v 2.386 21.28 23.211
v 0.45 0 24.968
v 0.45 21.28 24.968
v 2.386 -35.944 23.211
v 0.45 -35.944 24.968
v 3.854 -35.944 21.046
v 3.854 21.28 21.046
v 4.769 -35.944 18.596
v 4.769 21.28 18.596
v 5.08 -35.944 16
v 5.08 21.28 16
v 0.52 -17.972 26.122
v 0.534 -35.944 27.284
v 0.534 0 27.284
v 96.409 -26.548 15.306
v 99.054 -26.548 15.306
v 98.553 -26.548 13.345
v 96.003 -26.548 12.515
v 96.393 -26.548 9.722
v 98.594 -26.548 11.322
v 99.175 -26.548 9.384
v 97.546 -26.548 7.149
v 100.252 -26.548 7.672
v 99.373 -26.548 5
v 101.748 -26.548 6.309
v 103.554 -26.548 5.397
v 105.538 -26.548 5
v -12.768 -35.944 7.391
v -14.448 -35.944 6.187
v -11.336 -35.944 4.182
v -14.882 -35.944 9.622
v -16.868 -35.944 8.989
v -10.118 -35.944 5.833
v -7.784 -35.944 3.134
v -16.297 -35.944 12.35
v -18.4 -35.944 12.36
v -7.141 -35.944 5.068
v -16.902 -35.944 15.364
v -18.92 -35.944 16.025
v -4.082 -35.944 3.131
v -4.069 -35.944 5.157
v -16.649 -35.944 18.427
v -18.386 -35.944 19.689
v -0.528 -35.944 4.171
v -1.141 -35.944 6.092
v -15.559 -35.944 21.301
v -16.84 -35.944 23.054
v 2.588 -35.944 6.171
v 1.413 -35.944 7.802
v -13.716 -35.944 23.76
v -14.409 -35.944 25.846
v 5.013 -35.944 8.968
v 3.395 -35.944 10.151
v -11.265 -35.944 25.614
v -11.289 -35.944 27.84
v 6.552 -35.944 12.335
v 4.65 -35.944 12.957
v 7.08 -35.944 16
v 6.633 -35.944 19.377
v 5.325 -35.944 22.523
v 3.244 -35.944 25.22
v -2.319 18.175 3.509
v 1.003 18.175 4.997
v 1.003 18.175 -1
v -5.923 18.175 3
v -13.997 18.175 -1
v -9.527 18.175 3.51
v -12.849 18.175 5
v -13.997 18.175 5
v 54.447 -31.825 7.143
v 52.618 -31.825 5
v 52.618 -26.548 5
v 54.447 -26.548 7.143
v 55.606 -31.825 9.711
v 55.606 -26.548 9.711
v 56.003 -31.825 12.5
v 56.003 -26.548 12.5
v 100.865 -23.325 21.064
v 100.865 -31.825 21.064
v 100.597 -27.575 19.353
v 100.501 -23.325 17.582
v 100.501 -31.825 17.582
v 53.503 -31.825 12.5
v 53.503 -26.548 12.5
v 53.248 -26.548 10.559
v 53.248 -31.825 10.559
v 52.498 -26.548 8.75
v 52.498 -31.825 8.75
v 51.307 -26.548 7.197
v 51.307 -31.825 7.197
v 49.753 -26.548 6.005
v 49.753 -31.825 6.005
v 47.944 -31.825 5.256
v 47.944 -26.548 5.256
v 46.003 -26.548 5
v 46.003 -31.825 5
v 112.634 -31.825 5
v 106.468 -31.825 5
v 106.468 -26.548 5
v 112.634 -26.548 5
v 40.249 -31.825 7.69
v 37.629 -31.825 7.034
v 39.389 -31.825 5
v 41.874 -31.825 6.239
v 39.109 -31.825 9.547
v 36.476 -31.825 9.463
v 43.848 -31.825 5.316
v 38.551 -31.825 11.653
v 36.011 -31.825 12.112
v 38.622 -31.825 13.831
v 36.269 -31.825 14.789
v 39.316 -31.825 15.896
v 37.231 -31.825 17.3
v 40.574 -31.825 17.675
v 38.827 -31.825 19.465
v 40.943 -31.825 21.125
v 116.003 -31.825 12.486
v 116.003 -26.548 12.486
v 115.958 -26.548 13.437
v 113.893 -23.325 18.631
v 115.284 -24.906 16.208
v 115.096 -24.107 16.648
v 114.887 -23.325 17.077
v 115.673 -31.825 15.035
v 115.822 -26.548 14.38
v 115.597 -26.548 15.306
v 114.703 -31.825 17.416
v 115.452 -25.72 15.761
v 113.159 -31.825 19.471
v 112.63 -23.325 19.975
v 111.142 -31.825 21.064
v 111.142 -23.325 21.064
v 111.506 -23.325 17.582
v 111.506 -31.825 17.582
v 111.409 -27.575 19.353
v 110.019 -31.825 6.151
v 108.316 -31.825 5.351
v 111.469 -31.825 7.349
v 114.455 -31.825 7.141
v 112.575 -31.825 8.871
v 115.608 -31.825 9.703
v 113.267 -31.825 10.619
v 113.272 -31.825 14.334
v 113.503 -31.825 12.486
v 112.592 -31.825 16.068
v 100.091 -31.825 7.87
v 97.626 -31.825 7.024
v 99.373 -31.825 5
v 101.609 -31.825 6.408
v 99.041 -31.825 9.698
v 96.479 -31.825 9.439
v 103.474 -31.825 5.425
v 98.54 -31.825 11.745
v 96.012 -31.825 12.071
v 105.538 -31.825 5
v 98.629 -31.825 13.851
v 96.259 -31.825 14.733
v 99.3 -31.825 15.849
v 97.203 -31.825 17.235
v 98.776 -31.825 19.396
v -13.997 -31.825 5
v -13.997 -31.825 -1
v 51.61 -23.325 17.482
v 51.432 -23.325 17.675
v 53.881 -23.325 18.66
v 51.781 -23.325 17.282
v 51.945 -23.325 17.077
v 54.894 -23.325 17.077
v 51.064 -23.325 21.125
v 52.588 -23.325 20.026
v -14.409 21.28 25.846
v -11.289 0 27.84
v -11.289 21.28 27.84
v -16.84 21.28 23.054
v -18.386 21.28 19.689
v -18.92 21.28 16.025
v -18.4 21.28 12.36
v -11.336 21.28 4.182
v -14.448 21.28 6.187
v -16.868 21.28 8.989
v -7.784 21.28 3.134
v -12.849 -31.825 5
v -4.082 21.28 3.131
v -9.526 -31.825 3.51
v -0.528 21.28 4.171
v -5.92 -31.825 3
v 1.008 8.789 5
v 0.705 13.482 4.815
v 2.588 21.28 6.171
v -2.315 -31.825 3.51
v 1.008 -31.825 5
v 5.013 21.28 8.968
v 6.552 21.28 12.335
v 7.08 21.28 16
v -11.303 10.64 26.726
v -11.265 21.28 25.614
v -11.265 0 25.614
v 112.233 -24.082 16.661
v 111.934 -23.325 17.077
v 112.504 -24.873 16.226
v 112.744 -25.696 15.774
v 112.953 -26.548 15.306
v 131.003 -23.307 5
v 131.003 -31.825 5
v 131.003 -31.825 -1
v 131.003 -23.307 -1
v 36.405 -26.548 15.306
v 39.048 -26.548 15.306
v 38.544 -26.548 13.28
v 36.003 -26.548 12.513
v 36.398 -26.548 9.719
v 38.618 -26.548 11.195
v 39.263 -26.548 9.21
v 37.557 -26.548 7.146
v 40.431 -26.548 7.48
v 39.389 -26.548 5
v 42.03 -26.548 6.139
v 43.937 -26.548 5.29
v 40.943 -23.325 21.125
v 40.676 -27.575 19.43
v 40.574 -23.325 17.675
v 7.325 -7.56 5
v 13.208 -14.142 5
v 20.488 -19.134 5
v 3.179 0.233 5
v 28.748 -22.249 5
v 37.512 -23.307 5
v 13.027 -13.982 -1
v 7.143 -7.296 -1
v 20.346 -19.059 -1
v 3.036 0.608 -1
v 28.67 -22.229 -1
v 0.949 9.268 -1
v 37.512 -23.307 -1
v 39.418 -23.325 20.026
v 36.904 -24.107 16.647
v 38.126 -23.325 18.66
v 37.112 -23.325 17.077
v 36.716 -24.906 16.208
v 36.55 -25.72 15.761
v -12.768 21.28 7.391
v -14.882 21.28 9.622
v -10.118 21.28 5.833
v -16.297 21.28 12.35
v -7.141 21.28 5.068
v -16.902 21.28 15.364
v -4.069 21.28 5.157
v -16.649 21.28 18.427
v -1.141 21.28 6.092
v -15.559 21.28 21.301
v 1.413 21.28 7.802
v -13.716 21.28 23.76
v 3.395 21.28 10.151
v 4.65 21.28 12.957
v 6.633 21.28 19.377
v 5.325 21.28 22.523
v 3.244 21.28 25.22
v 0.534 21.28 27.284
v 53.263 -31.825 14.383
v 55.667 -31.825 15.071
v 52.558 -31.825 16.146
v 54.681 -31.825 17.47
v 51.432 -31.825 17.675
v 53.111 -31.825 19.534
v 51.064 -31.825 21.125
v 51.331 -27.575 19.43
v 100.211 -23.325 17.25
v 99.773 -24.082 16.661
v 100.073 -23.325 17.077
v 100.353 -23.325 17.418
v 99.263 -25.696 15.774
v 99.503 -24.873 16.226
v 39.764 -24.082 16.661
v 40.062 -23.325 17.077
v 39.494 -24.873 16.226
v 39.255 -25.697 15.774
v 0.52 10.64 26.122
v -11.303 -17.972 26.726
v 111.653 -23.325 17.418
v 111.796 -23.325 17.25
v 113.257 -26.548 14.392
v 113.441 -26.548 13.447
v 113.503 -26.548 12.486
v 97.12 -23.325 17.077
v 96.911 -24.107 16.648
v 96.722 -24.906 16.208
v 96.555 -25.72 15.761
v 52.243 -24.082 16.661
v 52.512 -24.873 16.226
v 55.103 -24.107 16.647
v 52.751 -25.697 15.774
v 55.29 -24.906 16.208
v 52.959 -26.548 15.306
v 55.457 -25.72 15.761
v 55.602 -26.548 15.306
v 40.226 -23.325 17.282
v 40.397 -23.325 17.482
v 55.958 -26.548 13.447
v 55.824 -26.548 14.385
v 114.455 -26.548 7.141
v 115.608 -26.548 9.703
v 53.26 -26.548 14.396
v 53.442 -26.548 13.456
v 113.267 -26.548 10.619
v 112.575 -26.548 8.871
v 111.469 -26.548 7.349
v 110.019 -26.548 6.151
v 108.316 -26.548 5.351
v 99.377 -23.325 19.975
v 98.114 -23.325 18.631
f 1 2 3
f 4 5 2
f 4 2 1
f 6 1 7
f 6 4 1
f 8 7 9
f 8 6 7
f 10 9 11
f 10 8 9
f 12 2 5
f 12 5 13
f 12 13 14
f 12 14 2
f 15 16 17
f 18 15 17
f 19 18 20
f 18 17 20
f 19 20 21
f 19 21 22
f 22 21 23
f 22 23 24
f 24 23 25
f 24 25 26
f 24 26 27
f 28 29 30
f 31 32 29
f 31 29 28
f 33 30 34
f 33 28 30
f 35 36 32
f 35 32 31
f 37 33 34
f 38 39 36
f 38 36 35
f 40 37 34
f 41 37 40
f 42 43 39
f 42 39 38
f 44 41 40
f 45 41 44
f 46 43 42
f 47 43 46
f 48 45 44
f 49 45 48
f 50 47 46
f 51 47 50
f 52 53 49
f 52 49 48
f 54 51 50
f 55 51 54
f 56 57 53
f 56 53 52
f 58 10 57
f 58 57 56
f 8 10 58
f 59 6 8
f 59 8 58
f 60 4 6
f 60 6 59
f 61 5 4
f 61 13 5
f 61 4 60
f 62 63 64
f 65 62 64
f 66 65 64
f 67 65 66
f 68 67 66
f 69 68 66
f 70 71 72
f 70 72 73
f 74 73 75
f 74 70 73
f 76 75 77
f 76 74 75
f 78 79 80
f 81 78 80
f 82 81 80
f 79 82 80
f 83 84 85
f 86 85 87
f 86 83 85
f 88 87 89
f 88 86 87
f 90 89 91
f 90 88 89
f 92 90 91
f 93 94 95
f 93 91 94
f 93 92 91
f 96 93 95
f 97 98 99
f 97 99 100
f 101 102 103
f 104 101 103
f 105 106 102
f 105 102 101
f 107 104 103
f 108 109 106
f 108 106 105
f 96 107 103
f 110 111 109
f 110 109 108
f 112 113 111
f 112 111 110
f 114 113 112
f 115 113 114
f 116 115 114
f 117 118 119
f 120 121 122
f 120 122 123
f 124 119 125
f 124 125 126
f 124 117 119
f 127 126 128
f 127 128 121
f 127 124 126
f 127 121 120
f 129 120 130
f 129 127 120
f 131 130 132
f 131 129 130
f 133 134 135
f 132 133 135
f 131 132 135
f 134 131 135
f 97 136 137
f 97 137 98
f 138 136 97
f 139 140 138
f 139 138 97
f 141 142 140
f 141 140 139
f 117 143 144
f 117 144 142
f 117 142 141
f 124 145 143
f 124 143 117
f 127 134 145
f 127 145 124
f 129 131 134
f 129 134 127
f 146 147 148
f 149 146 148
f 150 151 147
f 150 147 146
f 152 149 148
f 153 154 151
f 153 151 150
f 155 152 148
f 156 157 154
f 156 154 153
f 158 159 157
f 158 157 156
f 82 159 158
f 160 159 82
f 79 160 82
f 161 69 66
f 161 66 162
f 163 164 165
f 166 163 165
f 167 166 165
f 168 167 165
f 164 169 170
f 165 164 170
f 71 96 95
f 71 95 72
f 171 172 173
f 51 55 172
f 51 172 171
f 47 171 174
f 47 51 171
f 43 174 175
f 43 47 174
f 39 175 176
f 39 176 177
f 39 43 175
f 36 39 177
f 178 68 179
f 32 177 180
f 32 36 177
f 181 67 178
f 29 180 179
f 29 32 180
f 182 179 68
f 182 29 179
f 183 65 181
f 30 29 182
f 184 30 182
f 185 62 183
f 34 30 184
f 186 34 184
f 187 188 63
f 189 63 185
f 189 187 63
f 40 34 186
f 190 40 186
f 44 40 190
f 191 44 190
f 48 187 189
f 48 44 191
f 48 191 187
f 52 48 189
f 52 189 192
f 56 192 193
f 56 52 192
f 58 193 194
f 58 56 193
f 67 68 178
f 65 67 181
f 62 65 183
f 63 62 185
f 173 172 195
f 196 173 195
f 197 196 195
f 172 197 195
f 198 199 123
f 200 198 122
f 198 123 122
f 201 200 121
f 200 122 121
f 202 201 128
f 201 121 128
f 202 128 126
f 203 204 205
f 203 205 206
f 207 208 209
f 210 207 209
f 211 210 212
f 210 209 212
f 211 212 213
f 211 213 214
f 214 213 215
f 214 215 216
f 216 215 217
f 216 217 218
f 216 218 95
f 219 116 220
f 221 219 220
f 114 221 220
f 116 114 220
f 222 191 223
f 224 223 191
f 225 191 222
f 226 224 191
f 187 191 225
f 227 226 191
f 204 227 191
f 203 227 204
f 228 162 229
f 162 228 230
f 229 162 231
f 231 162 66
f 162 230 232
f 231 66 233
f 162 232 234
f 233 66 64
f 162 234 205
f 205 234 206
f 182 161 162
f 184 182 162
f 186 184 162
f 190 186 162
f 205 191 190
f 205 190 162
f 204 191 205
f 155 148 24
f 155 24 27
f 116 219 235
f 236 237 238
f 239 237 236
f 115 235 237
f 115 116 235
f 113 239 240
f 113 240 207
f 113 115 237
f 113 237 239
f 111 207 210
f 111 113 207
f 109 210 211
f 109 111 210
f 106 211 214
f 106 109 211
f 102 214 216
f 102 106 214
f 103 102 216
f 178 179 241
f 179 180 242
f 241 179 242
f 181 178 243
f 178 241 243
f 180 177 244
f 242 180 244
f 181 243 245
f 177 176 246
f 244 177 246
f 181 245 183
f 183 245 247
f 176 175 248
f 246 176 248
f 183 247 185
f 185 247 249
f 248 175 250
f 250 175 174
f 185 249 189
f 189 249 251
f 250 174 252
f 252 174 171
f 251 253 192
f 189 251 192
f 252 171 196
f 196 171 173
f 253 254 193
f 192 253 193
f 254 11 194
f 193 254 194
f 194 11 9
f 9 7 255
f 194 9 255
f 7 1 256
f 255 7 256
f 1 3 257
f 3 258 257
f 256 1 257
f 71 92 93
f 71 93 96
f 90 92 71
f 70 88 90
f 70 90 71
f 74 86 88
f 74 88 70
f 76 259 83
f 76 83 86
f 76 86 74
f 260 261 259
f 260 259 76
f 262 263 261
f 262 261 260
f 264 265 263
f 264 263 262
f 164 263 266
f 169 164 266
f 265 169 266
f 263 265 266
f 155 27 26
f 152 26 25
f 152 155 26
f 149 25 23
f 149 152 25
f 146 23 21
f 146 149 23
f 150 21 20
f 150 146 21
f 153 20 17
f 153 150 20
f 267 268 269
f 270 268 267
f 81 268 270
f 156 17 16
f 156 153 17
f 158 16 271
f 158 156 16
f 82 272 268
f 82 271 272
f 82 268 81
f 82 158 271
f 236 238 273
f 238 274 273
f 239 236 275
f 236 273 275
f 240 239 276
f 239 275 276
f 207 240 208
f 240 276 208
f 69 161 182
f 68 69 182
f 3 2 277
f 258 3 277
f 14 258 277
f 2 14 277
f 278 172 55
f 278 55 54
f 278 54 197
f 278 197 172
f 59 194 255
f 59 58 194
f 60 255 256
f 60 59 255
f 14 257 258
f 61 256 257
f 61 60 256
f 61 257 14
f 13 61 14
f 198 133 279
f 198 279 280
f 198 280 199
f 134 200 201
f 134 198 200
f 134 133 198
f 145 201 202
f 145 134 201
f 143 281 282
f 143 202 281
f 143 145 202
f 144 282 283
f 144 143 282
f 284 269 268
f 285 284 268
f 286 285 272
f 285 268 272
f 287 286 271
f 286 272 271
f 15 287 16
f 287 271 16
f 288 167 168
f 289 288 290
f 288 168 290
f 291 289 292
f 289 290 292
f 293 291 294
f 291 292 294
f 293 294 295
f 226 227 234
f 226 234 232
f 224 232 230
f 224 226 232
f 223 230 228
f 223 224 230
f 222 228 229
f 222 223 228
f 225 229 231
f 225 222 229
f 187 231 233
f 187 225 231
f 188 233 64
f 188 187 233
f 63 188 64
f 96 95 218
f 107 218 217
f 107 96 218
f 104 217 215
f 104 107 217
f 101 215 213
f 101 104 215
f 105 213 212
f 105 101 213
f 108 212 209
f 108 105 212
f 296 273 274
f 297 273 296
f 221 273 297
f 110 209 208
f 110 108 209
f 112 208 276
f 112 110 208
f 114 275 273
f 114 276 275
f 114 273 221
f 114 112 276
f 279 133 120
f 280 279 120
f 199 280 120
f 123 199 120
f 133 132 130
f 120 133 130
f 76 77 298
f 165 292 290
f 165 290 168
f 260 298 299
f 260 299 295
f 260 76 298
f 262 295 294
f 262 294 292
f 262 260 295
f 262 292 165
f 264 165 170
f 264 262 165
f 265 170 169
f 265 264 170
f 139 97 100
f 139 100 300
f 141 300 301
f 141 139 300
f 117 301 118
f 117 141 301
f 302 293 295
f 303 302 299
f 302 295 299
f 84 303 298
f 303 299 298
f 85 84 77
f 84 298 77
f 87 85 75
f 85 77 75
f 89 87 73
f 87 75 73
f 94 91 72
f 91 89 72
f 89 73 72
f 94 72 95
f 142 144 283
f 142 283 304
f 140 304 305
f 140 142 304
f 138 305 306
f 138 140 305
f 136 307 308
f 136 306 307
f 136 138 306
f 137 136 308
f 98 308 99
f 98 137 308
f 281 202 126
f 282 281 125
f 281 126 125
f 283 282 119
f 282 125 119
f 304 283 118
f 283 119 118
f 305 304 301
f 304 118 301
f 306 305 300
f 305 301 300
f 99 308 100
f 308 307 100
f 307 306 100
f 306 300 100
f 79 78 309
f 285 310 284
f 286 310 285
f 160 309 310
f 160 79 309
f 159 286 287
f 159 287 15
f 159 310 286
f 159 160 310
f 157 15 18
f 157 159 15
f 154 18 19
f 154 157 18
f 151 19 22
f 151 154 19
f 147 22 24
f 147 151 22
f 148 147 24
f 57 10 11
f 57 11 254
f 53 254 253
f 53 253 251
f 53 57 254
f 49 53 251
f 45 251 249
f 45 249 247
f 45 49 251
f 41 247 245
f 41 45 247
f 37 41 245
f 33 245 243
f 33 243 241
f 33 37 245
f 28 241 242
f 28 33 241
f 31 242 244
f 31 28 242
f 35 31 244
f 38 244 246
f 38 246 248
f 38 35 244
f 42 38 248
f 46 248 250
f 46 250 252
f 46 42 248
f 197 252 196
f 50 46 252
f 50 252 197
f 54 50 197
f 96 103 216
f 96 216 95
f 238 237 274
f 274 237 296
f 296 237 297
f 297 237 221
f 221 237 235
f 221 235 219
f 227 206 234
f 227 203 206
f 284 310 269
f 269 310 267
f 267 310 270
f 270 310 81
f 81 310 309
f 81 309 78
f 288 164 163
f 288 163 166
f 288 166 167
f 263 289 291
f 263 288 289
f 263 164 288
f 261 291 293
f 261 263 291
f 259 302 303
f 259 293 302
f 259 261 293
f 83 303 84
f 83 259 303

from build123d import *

# Parameters (mm, degrees)
F1_DEPTH      = 5
F1_DEPTH_BACK = 1
F3_DEPTH      = 35.944447
F3_DEPTH_BACK = 21.279896
F5_DEPTH      = 8.5
F7_DEPTH      = 102.259973


with BuildPart() as f1:
    # F0 (on Top) → F1 (new body, two sides)
    with BuildSketch(Plane.XY) as f1_sk:
        with BuildLine():
            Line((1.003299, 18.174614), (-13.996701, 18.174614))
            Line((-13.996701, 18.174614), (-13.996701, -31.825386))
            Line((-13.996701, -31.825386), (131.003299, -31.825386))
            Line((131.003299, -31.825386), (131.003299, -23.307258))
            Line((131.003299, -23.307258), (37.51162, -23.307258))
            ThreePointArc((37.51162, -23.307258), (9.881912, -10.817771), (1.003299, 18.174614))
        make_face()
    extrude(amount=F1_DEPTH)
    extrude(f1_sk.sketch, amount=-F1_DEPTH_BACK)

    # F2 (on Front) → F3 (join, two sides)
    with BuildSketch(Plane.XZ) as f3_sk:
        with BuildLine():
            ThreePointArc((0.449709, 24.967801), (3.853817, 21.046216), (5.07958, 16))
            ThreePointArc((5.07958, 16), (-11.49771, 6.518765), (-11.264752, 25.614474))
            add(Edge.make_bspline(
                [(-11.28924, 27.839585), (-11.329412, 26.724718), (-11.264752, 25.614474)],
                knots=[1.498789, 1.498789, 1.498789, 1.686859, 1.686859, 1.686859], degree=2, weights=[1, 0.995582, 1]))
            ThreePointArc((-11.28924, 27.839585), (-12.963335, 5.073091), (7.07958, 16))
            ThreePointArc((7.07958, 16), (5.32486, 22.522553), (0.534397, 27.284296))
            add(Edge.make_bspline(
                [(0.449709, 24.967801), (0.549024, 26.117702), (0.534397, 27.284296)],
                knots=[4.541188, 4.541188, 4.541188, 4.737483, 4.737483, 4.737483], degree=2, weights=[1, 0.995187, 1]))
        make_face()
    extrude(amount=F3_DEPTH)
    extrude(f3_sk.sketch, amount=-F3_DEPTH_BACK)


with BuildPart() as f5:
    # F4 (on face) → F5 (new body)
    with BuildSketch(Plane.XZ.offset(31.825386)):
        with BuildLine():
            Line((39.38892, 5), (46.003299, 5))
            ThreePointArc((46.003299, 5), (39.109089, 9.547056), (40.574442, 17.674699))
            add(Edge.make_bspline(
                [(40.942947, 21.125128), (40.591384, 19.460524), (40.574442, 17.674699)],
                knots=[1.199834, 1.199834, 1.199834, 1.553326, 1.553326, 1.553326], degree=2, weights=[1, 0.984421, 1]))
            ThreePointArc((40.942947, 21.125128), (36.049416, 13.459285), (39.38892, 5))
        make_face()
        with BuildLine():
            ThreePointArc((51.432156, 17.674699), (52.966288, 15.286895), (53.503299, 12.5))
            ThreePointArc((53.503299, 12.5), (51.3066, 7.196699), (46.003299, 5))
            Line((46.003299, 5), (52.617677, 5))
            ThreePointArc((52.617677, 5), (55.117677, 8.385622), (56.003299, 12.5))
            ThreePointArc((56.003299, 12.5), (54.680957, 17.469732), (51.06365, 21.125128))
            add(Edge.make_bspline(
                [(51.432156, 17.674699), (51.415213, 19.460524), (51.06365, 21.125128)],
                knots=[4.72986, 4.72986, 4.72986, 5.083352, 5.083352, 5.083352], degree=2, weights=[1, 0.984421, 1]))
        make_face()
        with BuildLine():
            Line((106.468237, 5), (112.633998, 5))
            ThreePointArc((112.633998, 5), (115.122152, 8.381125), (116.003299, 12.485575))
            ThreePointArc((116.003299, 12.485575), (114.703426, 17.415868), (111.141741, 21.06441))
            add(Edge.make_bspline(
                [(111.505966, 17.581716), (111.496438, 19.382666), (111.141741, 21.06441)],
                knots=[4.722003, 4.722003, 4.722003, 5.078389, 5.078389, 5.078389], degree=2, weights=[1, 0.984166, 1]))
            ThreePointArc((111.505966, 17.581716), (112.986135, 15.222361), (113.503299, 12.485575))
            ThreePointArc((113.503299, 12.485575), (111.468509, 7.349284), (106.468237, 5))
        make_face()
        with BuildLine():
            ThreePointArc((100.864856, 21.06441), (96.046166, 13.410514), (99.3726, 5))
            Line((99.3726, 5), (105.53836, 5))
            ThreePointArc((105.53836, 5), (99.040686, 9.69774), (100.500631, 17.581716))
            add(Edge.make_bspline(
                [(100.864856, 21.06441), (100.51016, 19.382666), (100.500631, 17.581716)],
                knots=[1.204796, 1.204796, 1.204796, 1.561182, 1.561182, 1.561182], degree=2, weights=[1, 0.984166, 1]))
        make_face()
    extrude(amount=-F5_DEPTH)

    # F6 (on face) → F7 (cut)
    with BuildSketch(Plane.YZ.offset(131.003299)):
        Polygon((-26.547706, 15.305716), (-26.547706, 5), (-23.307258, 5), (-22.667259, 5), (-22.667259, 17.438939), align=None)
    extrude(amount=-F7_DEPTH, mode=Mode.SUBTRACT)


solid = Compound([f1.part, f5.part])
